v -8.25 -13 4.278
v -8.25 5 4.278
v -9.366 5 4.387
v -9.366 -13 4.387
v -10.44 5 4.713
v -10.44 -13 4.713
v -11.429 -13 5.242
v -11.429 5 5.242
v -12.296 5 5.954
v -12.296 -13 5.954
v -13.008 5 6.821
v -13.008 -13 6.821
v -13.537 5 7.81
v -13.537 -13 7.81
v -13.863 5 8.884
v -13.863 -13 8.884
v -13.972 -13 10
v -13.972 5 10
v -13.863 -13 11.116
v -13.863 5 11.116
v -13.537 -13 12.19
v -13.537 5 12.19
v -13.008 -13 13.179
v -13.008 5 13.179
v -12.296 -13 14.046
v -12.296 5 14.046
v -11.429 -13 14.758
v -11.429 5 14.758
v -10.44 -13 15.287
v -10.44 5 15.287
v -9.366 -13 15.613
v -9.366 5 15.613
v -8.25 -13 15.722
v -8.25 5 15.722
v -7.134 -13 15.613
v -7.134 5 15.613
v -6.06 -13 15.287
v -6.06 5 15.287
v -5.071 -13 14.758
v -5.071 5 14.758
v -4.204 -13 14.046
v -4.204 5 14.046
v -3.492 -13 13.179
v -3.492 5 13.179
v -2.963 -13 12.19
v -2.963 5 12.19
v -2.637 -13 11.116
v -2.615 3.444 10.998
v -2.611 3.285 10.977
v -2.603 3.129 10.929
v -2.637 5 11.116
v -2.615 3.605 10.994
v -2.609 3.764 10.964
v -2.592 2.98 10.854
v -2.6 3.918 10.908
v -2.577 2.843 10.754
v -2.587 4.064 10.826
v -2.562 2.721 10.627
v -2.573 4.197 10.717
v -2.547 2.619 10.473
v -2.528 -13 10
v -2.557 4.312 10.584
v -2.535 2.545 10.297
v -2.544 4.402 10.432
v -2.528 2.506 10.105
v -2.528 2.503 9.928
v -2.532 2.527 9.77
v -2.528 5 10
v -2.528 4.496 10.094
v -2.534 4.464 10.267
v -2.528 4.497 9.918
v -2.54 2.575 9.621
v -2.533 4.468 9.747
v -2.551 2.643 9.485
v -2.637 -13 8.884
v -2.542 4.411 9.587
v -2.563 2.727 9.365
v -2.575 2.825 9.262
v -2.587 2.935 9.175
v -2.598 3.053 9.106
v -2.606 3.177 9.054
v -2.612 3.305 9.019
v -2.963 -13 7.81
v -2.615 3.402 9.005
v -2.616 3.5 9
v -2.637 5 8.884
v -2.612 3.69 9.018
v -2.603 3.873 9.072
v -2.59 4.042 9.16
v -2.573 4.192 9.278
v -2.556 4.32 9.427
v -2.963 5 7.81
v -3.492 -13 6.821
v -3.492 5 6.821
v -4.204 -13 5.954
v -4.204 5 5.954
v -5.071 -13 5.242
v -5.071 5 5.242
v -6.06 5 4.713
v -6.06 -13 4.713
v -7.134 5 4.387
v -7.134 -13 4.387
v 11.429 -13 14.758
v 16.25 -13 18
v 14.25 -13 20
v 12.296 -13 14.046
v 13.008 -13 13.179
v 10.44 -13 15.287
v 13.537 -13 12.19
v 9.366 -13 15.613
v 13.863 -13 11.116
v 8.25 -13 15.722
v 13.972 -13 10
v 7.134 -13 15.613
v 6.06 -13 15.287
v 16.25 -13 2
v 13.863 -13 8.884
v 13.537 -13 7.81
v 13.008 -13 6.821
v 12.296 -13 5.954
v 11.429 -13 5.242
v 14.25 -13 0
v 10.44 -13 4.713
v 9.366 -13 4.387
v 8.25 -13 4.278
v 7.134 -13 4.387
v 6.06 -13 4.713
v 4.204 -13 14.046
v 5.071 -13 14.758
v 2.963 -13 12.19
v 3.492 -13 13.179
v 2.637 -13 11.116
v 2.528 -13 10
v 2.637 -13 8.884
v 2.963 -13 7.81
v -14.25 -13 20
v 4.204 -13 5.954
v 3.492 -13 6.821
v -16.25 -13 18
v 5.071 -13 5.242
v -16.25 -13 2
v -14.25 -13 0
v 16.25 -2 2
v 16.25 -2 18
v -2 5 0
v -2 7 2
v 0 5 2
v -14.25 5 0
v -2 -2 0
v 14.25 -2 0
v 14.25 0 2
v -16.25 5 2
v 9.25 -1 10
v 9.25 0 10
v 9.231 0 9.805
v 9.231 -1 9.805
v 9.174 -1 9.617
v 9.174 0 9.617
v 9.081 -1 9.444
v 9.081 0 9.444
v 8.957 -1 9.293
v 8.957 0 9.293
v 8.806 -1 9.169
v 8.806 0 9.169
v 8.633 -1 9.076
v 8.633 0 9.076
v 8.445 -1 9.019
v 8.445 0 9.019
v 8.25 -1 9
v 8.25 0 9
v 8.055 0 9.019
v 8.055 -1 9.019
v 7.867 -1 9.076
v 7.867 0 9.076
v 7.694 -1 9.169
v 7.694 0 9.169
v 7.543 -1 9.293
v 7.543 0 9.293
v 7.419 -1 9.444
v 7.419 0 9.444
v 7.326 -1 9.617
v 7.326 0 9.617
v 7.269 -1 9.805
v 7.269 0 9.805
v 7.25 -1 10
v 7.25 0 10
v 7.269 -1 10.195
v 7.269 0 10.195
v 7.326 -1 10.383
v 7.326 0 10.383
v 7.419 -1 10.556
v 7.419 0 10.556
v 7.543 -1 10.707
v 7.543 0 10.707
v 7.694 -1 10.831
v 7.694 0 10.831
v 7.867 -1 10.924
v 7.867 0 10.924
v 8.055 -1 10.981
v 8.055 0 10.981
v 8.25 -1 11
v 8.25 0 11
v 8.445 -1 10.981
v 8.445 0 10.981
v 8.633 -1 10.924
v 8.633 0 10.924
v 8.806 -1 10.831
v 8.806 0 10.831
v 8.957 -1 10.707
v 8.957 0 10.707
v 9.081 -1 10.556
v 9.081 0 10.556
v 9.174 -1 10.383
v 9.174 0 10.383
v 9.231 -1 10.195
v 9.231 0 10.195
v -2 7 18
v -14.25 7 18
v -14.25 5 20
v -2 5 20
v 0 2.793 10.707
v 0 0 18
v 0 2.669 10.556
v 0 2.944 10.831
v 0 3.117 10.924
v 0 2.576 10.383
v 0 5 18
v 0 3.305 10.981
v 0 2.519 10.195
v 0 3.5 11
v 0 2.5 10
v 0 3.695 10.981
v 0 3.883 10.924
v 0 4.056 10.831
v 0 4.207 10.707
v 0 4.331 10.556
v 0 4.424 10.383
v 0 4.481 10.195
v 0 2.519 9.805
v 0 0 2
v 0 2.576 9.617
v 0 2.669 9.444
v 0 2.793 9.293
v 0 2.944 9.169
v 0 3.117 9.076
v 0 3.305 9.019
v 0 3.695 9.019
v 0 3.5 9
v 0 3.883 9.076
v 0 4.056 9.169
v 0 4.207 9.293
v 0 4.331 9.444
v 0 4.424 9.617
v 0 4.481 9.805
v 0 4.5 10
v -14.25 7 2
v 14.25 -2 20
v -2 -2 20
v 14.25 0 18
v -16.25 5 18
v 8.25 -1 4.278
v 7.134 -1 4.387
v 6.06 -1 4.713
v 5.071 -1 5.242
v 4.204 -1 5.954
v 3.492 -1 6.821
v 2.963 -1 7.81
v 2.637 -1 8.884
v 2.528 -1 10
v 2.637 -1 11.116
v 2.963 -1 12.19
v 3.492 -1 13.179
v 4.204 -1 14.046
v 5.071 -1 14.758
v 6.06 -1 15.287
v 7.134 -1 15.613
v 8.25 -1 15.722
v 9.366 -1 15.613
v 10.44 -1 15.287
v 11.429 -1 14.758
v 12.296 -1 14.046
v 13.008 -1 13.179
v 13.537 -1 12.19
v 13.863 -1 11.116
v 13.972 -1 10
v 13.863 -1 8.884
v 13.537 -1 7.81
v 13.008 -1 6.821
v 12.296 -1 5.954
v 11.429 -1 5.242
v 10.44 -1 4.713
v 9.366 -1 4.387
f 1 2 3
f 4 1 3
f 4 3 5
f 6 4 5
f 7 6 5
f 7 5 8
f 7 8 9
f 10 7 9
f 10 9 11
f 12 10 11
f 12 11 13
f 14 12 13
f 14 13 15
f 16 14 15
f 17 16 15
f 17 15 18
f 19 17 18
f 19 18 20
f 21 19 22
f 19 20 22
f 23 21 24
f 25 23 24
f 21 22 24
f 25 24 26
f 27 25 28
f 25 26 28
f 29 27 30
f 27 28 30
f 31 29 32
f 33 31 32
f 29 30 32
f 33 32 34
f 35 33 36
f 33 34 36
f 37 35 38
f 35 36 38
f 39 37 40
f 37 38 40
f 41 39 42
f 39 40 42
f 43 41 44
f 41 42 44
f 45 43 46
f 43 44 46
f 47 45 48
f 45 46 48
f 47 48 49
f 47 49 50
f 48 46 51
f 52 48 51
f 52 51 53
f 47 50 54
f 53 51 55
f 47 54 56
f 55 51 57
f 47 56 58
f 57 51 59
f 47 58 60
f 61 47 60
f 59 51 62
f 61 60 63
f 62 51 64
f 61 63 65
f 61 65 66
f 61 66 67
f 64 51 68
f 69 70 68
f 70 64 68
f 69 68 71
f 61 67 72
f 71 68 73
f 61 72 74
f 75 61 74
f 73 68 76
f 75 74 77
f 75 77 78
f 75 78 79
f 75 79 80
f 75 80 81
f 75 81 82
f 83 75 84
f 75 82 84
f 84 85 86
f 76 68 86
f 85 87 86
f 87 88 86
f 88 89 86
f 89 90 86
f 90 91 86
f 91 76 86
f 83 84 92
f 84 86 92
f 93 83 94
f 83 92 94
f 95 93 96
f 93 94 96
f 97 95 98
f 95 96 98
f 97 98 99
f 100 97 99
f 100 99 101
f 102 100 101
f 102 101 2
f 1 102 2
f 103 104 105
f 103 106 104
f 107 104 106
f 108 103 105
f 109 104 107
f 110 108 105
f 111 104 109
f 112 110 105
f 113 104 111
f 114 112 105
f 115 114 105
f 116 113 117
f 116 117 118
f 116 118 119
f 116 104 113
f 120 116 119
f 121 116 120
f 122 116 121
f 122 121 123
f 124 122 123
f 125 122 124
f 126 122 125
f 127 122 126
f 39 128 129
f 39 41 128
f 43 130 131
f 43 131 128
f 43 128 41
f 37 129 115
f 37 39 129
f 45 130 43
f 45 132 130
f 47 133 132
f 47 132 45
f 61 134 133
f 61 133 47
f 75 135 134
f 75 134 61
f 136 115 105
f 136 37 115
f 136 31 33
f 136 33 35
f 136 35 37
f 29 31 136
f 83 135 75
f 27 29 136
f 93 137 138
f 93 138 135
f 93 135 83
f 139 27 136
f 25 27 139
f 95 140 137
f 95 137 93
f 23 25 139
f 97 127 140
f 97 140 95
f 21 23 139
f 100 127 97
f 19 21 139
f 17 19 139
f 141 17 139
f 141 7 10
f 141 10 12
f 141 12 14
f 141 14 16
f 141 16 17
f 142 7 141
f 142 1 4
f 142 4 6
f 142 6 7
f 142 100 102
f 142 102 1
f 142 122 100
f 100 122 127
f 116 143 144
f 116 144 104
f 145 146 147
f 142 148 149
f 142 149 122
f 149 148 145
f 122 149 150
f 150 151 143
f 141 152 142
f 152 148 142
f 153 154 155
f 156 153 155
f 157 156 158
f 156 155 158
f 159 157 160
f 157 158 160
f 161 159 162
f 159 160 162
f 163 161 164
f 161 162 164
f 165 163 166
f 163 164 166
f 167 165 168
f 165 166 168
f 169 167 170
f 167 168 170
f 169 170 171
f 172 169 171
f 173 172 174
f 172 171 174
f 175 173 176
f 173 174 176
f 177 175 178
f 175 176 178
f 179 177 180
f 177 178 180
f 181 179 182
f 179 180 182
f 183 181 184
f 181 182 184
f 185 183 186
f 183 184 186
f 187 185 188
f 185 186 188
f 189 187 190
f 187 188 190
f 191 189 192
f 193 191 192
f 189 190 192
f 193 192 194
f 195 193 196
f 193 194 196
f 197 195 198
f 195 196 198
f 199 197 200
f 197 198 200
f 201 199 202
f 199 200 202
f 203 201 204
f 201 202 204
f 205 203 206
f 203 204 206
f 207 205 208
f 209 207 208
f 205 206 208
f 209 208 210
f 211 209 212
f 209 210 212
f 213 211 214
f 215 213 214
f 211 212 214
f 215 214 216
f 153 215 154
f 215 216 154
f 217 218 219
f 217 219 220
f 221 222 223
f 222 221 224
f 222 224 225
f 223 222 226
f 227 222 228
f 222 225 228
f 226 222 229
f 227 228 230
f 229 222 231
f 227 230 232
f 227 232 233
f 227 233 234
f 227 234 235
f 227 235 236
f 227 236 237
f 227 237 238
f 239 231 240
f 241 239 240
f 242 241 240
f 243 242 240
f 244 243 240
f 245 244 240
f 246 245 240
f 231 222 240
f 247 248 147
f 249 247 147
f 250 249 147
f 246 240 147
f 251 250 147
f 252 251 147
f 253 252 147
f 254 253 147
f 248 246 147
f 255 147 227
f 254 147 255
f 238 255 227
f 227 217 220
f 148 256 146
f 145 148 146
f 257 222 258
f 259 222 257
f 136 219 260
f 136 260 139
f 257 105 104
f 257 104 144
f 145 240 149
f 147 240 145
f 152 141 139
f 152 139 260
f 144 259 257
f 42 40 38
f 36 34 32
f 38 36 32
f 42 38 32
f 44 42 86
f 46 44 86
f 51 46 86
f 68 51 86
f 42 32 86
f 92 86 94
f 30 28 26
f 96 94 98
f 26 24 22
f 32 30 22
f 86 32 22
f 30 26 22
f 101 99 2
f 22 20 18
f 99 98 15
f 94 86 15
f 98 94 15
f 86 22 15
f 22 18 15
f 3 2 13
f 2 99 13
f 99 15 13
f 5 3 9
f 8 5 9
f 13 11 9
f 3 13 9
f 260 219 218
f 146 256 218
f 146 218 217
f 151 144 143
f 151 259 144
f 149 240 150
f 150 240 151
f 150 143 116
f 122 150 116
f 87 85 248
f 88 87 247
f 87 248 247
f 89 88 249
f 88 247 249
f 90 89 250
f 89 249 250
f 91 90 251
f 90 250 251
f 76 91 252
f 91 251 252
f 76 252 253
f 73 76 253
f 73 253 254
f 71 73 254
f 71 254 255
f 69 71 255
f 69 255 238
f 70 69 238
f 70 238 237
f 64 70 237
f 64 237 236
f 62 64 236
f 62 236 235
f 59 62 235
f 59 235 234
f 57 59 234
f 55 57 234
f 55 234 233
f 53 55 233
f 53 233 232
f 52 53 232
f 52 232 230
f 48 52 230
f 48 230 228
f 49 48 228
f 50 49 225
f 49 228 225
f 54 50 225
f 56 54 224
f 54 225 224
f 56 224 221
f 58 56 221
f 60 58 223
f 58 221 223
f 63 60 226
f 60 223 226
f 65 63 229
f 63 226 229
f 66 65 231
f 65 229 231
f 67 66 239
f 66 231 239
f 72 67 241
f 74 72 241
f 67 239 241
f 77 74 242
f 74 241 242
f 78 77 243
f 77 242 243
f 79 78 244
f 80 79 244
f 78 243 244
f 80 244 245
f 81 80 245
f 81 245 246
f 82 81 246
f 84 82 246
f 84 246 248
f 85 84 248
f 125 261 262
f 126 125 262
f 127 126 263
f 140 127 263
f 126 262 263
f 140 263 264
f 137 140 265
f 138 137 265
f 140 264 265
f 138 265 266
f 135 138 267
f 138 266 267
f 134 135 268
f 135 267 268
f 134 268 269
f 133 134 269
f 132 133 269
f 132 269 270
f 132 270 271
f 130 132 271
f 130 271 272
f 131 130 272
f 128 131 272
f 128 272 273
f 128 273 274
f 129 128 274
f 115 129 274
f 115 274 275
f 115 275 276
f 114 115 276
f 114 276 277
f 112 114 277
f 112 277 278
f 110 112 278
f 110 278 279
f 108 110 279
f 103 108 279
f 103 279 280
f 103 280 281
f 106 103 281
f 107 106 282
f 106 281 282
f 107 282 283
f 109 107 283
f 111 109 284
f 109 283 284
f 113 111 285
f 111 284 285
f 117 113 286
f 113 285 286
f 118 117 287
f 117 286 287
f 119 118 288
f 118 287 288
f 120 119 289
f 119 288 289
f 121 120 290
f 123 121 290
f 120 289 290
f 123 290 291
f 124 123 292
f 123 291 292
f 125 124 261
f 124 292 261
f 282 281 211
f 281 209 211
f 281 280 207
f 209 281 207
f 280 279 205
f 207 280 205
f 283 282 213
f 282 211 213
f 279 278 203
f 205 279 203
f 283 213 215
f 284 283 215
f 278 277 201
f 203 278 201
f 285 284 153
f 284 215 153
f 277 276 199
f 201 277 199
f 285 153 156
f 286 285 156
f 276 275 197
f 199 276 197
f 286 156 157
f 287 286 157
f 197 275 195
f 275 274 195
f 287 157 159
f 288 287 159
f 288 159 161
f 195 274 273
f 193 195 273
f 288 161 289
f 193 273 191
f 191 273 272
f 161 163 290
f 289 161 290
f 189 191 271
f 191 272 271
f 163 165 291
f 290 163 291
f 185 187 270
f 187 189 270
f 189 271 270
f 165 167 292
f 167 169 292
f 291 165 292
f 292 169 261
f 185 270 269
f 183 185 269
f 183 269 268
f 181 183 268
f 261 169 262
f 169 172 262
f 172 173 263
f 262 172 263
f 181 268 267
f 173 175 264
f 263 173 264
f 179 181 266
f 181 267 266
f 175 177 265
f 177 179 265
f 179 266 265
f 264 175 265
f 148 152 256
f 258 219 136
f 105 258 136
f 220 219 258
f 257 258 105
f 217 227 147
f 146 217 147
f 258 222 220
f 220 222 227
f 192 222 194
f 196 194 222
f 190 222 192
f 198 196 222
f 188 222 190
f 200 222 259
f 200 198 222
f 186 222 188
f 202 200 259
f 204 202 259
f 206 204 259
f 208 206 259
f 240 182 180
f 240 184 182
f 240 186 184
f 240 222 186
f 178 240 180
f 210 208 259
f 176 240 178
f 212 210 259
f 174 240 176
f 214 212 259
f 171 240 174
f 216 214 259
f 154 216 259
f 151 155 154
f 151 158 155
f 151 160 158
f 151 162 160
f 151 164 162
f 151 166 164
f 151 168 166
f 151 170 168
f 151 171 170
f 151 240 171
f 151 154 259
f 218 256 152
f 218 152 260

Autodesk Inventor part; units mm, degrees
ref_plane "YZ Plane" through (0, 0, 0) normal (1, 0, 0) x (0, 1, 0)
ref_plane "XZ Plane" through (0, 0, 0) normal (0, 1, 0) x (-1, 0, 0)
ref_plane "XY Plane" through (0, 0, 0) normal (0, 0, 1) x (1, 0, 0)
sketch "Skizze3" plane through (0, 0, 0) normal (0, 0, 1) x (1, 0, 0)
  line L0 (-22.75, 0) -> (22.75, 0) projected
  line L1 (0, -17) -> (0, 11) projected
  line L2 (-16.25, 7) -> (0, 7)
  line L3 (16.25, 0) -> (16.25, -13)
  line L4 (16.25, -13) -> (-16.25, -13)
  line L5 (-16.25, -13) -> (-16.25, 7)
  line L6 (0, 7) -> (0, 0)
  line L7 (16.25, 0) -> (0, 0)
  point P0 (16.25, 0)
  point P1 (0, 7)
  dimension "d4" = 20
  dimension "d5" = 32.5
  dimension "d41" = 7
extrude "Extrusion3" add sketch "Skizze3" along normal blind 20
sketch "Skizze6" plane through (0, 0, 0) normal (0, 1, 0) x (1, 0, 0)
  line L0 (16.25, 0) -> (0, 0) projected
  line L1 (16.25, 0) -> (16.25, -20) projected
  circle A0 centre (8.25, -10) radius 1
  dimension "d21" = 10
  dimension "d22" = 8
  dimension "d23" = 2
extrude "Extrusion6" cut sketch "Skizze6" against normal blind 3
sketch "Skizze7" plane through (0, 0, 0) normal (1, 0, 0) x (0, 0, -1)
  line L0 (0, 0) -> (0, 7) projected
  line L1 (0, 7) -> (-20, 7) projected
  circle A0 centre (-10, 3.5) radius 1
  dimension "d26" = 10
  dimension "d27" = 3.5
  dimension "d28" = 2
extrude "Extrusion7" cut sketch "Skizze7" against normal blind 10
chamfer "Fase4" distance 2 angle 45 13 edges at (-8.125, 7, 20) (-16.25, -3, 20) (-16.25, 7, 10) (-16.25, -3, 0) (-8.125, 7, 0) (0, 7, 10) (8.125, 0, 0) (8.125, 0, 20) (16.25, 0, 10) (16.25, -6.5, 0) (16.25, -6.5, 20) (0, 3.5, 20) (0, 3.5, 0)
sketch "Skizze9" plane through (-14.25, -13, 0) normal (0, -1, 0) x (1, 0, 0)
  circle A0 centre (22.5, 10) radius 1 projected
  line L0 (-2, 2) -> (-2, 18) projected
  point P0 (14.25, 0)
hole "Bohrung1" at (8.25, -13, 10) direction (0, 1, 0) diameter 11.445 depth 12 thread size "G13.157x1.337" designation "G 1/4" standard "ISO Pipe Threads"
sketch "Skizze10" plane through (-14.25, -13, 0) normal (0, -1, 0) x (1, 0, 0)
  line L0 (0, 0) -> (28.5, 0) projected
  line L1 (-2, 2) -> (-2, 18) projected
  point P0 (14.25, 0)
  point P1 (6, 10)
  dimension "d53" = 10
  dimension "d54" = 8
hole "Bohrung2" at (-8.25, -13, 10) direction (0, 1, 0) diameter 11.445 depth 18 thread size "G13.157x1.337" designation "G 1/4" standard "ISO Pipe Threads"
properties part number "1"
